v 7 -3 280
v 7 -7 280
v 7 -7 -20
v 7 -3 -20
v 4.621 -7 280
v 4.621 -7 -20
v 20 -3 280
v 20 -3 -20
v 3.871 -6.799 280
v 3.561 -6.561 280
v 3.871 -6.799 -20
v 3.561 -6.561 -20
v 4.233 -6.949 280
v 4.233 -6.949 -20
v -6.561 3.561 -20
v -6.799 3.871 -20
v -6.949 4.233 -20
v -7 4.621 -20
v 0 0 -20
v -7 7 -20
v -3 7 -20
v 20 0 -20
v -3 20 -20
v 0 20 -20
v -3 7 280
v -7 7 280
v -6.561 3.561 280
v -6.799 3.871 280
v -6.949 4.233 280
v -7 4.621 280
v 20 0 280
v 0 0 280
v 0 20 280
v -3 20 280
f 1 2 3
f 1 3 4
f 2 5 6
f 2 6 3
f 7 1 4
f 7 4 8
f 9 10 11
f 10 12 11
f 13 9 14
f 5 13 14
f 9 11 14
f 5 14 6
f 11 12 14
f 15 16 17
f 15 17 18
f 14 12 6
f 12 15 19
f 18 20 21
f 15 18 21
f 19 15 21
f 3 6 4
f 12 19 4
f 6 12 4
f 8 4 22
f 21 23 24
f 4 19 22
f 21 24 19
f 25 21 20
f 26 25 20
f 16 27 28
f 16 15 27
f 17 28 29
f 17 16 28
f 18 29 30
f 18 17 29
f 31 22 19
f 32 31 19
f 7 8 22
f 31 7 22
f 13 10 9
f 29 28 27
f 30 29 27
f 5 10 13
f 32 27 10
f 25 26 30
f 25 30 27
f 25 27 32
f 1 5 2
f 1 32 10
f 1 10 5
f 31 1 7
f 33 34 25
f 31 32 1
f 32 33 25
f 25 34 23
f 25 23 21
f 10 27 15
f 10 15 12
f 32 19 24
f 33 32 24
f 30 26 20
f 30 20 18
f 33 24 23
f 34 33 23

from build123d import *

# Parameters (mm, degrees)
BOSS_EXTRUDE1_DEPTH = 300
FILLET1_R           = 1.5


with BuildPart() as part:
    # Sketch1 → Boss-Extrude1 (new body)
    with BuildSketch(Plane.XY.offset(280)):
        Polygon((-7, 4), (4, -7), (7, -7), (7, -3), (20, -3), (20, 0), (0, 0), (0, 20), (-3, 20), (-3, 7), (-7, 7), align=None)
    extrude(amount=-BOSS_EXTRUDE1_DEPTH)

    # Fillet1
    fillet1_edges = [part.edges().sort_by_distance(p)[0] for p in [
        (4, -7, 130),
        (-7, 4, 130),
    ]]
    fillet(fillet1_edges, radius=FILLET1_R)


solid = part.part
